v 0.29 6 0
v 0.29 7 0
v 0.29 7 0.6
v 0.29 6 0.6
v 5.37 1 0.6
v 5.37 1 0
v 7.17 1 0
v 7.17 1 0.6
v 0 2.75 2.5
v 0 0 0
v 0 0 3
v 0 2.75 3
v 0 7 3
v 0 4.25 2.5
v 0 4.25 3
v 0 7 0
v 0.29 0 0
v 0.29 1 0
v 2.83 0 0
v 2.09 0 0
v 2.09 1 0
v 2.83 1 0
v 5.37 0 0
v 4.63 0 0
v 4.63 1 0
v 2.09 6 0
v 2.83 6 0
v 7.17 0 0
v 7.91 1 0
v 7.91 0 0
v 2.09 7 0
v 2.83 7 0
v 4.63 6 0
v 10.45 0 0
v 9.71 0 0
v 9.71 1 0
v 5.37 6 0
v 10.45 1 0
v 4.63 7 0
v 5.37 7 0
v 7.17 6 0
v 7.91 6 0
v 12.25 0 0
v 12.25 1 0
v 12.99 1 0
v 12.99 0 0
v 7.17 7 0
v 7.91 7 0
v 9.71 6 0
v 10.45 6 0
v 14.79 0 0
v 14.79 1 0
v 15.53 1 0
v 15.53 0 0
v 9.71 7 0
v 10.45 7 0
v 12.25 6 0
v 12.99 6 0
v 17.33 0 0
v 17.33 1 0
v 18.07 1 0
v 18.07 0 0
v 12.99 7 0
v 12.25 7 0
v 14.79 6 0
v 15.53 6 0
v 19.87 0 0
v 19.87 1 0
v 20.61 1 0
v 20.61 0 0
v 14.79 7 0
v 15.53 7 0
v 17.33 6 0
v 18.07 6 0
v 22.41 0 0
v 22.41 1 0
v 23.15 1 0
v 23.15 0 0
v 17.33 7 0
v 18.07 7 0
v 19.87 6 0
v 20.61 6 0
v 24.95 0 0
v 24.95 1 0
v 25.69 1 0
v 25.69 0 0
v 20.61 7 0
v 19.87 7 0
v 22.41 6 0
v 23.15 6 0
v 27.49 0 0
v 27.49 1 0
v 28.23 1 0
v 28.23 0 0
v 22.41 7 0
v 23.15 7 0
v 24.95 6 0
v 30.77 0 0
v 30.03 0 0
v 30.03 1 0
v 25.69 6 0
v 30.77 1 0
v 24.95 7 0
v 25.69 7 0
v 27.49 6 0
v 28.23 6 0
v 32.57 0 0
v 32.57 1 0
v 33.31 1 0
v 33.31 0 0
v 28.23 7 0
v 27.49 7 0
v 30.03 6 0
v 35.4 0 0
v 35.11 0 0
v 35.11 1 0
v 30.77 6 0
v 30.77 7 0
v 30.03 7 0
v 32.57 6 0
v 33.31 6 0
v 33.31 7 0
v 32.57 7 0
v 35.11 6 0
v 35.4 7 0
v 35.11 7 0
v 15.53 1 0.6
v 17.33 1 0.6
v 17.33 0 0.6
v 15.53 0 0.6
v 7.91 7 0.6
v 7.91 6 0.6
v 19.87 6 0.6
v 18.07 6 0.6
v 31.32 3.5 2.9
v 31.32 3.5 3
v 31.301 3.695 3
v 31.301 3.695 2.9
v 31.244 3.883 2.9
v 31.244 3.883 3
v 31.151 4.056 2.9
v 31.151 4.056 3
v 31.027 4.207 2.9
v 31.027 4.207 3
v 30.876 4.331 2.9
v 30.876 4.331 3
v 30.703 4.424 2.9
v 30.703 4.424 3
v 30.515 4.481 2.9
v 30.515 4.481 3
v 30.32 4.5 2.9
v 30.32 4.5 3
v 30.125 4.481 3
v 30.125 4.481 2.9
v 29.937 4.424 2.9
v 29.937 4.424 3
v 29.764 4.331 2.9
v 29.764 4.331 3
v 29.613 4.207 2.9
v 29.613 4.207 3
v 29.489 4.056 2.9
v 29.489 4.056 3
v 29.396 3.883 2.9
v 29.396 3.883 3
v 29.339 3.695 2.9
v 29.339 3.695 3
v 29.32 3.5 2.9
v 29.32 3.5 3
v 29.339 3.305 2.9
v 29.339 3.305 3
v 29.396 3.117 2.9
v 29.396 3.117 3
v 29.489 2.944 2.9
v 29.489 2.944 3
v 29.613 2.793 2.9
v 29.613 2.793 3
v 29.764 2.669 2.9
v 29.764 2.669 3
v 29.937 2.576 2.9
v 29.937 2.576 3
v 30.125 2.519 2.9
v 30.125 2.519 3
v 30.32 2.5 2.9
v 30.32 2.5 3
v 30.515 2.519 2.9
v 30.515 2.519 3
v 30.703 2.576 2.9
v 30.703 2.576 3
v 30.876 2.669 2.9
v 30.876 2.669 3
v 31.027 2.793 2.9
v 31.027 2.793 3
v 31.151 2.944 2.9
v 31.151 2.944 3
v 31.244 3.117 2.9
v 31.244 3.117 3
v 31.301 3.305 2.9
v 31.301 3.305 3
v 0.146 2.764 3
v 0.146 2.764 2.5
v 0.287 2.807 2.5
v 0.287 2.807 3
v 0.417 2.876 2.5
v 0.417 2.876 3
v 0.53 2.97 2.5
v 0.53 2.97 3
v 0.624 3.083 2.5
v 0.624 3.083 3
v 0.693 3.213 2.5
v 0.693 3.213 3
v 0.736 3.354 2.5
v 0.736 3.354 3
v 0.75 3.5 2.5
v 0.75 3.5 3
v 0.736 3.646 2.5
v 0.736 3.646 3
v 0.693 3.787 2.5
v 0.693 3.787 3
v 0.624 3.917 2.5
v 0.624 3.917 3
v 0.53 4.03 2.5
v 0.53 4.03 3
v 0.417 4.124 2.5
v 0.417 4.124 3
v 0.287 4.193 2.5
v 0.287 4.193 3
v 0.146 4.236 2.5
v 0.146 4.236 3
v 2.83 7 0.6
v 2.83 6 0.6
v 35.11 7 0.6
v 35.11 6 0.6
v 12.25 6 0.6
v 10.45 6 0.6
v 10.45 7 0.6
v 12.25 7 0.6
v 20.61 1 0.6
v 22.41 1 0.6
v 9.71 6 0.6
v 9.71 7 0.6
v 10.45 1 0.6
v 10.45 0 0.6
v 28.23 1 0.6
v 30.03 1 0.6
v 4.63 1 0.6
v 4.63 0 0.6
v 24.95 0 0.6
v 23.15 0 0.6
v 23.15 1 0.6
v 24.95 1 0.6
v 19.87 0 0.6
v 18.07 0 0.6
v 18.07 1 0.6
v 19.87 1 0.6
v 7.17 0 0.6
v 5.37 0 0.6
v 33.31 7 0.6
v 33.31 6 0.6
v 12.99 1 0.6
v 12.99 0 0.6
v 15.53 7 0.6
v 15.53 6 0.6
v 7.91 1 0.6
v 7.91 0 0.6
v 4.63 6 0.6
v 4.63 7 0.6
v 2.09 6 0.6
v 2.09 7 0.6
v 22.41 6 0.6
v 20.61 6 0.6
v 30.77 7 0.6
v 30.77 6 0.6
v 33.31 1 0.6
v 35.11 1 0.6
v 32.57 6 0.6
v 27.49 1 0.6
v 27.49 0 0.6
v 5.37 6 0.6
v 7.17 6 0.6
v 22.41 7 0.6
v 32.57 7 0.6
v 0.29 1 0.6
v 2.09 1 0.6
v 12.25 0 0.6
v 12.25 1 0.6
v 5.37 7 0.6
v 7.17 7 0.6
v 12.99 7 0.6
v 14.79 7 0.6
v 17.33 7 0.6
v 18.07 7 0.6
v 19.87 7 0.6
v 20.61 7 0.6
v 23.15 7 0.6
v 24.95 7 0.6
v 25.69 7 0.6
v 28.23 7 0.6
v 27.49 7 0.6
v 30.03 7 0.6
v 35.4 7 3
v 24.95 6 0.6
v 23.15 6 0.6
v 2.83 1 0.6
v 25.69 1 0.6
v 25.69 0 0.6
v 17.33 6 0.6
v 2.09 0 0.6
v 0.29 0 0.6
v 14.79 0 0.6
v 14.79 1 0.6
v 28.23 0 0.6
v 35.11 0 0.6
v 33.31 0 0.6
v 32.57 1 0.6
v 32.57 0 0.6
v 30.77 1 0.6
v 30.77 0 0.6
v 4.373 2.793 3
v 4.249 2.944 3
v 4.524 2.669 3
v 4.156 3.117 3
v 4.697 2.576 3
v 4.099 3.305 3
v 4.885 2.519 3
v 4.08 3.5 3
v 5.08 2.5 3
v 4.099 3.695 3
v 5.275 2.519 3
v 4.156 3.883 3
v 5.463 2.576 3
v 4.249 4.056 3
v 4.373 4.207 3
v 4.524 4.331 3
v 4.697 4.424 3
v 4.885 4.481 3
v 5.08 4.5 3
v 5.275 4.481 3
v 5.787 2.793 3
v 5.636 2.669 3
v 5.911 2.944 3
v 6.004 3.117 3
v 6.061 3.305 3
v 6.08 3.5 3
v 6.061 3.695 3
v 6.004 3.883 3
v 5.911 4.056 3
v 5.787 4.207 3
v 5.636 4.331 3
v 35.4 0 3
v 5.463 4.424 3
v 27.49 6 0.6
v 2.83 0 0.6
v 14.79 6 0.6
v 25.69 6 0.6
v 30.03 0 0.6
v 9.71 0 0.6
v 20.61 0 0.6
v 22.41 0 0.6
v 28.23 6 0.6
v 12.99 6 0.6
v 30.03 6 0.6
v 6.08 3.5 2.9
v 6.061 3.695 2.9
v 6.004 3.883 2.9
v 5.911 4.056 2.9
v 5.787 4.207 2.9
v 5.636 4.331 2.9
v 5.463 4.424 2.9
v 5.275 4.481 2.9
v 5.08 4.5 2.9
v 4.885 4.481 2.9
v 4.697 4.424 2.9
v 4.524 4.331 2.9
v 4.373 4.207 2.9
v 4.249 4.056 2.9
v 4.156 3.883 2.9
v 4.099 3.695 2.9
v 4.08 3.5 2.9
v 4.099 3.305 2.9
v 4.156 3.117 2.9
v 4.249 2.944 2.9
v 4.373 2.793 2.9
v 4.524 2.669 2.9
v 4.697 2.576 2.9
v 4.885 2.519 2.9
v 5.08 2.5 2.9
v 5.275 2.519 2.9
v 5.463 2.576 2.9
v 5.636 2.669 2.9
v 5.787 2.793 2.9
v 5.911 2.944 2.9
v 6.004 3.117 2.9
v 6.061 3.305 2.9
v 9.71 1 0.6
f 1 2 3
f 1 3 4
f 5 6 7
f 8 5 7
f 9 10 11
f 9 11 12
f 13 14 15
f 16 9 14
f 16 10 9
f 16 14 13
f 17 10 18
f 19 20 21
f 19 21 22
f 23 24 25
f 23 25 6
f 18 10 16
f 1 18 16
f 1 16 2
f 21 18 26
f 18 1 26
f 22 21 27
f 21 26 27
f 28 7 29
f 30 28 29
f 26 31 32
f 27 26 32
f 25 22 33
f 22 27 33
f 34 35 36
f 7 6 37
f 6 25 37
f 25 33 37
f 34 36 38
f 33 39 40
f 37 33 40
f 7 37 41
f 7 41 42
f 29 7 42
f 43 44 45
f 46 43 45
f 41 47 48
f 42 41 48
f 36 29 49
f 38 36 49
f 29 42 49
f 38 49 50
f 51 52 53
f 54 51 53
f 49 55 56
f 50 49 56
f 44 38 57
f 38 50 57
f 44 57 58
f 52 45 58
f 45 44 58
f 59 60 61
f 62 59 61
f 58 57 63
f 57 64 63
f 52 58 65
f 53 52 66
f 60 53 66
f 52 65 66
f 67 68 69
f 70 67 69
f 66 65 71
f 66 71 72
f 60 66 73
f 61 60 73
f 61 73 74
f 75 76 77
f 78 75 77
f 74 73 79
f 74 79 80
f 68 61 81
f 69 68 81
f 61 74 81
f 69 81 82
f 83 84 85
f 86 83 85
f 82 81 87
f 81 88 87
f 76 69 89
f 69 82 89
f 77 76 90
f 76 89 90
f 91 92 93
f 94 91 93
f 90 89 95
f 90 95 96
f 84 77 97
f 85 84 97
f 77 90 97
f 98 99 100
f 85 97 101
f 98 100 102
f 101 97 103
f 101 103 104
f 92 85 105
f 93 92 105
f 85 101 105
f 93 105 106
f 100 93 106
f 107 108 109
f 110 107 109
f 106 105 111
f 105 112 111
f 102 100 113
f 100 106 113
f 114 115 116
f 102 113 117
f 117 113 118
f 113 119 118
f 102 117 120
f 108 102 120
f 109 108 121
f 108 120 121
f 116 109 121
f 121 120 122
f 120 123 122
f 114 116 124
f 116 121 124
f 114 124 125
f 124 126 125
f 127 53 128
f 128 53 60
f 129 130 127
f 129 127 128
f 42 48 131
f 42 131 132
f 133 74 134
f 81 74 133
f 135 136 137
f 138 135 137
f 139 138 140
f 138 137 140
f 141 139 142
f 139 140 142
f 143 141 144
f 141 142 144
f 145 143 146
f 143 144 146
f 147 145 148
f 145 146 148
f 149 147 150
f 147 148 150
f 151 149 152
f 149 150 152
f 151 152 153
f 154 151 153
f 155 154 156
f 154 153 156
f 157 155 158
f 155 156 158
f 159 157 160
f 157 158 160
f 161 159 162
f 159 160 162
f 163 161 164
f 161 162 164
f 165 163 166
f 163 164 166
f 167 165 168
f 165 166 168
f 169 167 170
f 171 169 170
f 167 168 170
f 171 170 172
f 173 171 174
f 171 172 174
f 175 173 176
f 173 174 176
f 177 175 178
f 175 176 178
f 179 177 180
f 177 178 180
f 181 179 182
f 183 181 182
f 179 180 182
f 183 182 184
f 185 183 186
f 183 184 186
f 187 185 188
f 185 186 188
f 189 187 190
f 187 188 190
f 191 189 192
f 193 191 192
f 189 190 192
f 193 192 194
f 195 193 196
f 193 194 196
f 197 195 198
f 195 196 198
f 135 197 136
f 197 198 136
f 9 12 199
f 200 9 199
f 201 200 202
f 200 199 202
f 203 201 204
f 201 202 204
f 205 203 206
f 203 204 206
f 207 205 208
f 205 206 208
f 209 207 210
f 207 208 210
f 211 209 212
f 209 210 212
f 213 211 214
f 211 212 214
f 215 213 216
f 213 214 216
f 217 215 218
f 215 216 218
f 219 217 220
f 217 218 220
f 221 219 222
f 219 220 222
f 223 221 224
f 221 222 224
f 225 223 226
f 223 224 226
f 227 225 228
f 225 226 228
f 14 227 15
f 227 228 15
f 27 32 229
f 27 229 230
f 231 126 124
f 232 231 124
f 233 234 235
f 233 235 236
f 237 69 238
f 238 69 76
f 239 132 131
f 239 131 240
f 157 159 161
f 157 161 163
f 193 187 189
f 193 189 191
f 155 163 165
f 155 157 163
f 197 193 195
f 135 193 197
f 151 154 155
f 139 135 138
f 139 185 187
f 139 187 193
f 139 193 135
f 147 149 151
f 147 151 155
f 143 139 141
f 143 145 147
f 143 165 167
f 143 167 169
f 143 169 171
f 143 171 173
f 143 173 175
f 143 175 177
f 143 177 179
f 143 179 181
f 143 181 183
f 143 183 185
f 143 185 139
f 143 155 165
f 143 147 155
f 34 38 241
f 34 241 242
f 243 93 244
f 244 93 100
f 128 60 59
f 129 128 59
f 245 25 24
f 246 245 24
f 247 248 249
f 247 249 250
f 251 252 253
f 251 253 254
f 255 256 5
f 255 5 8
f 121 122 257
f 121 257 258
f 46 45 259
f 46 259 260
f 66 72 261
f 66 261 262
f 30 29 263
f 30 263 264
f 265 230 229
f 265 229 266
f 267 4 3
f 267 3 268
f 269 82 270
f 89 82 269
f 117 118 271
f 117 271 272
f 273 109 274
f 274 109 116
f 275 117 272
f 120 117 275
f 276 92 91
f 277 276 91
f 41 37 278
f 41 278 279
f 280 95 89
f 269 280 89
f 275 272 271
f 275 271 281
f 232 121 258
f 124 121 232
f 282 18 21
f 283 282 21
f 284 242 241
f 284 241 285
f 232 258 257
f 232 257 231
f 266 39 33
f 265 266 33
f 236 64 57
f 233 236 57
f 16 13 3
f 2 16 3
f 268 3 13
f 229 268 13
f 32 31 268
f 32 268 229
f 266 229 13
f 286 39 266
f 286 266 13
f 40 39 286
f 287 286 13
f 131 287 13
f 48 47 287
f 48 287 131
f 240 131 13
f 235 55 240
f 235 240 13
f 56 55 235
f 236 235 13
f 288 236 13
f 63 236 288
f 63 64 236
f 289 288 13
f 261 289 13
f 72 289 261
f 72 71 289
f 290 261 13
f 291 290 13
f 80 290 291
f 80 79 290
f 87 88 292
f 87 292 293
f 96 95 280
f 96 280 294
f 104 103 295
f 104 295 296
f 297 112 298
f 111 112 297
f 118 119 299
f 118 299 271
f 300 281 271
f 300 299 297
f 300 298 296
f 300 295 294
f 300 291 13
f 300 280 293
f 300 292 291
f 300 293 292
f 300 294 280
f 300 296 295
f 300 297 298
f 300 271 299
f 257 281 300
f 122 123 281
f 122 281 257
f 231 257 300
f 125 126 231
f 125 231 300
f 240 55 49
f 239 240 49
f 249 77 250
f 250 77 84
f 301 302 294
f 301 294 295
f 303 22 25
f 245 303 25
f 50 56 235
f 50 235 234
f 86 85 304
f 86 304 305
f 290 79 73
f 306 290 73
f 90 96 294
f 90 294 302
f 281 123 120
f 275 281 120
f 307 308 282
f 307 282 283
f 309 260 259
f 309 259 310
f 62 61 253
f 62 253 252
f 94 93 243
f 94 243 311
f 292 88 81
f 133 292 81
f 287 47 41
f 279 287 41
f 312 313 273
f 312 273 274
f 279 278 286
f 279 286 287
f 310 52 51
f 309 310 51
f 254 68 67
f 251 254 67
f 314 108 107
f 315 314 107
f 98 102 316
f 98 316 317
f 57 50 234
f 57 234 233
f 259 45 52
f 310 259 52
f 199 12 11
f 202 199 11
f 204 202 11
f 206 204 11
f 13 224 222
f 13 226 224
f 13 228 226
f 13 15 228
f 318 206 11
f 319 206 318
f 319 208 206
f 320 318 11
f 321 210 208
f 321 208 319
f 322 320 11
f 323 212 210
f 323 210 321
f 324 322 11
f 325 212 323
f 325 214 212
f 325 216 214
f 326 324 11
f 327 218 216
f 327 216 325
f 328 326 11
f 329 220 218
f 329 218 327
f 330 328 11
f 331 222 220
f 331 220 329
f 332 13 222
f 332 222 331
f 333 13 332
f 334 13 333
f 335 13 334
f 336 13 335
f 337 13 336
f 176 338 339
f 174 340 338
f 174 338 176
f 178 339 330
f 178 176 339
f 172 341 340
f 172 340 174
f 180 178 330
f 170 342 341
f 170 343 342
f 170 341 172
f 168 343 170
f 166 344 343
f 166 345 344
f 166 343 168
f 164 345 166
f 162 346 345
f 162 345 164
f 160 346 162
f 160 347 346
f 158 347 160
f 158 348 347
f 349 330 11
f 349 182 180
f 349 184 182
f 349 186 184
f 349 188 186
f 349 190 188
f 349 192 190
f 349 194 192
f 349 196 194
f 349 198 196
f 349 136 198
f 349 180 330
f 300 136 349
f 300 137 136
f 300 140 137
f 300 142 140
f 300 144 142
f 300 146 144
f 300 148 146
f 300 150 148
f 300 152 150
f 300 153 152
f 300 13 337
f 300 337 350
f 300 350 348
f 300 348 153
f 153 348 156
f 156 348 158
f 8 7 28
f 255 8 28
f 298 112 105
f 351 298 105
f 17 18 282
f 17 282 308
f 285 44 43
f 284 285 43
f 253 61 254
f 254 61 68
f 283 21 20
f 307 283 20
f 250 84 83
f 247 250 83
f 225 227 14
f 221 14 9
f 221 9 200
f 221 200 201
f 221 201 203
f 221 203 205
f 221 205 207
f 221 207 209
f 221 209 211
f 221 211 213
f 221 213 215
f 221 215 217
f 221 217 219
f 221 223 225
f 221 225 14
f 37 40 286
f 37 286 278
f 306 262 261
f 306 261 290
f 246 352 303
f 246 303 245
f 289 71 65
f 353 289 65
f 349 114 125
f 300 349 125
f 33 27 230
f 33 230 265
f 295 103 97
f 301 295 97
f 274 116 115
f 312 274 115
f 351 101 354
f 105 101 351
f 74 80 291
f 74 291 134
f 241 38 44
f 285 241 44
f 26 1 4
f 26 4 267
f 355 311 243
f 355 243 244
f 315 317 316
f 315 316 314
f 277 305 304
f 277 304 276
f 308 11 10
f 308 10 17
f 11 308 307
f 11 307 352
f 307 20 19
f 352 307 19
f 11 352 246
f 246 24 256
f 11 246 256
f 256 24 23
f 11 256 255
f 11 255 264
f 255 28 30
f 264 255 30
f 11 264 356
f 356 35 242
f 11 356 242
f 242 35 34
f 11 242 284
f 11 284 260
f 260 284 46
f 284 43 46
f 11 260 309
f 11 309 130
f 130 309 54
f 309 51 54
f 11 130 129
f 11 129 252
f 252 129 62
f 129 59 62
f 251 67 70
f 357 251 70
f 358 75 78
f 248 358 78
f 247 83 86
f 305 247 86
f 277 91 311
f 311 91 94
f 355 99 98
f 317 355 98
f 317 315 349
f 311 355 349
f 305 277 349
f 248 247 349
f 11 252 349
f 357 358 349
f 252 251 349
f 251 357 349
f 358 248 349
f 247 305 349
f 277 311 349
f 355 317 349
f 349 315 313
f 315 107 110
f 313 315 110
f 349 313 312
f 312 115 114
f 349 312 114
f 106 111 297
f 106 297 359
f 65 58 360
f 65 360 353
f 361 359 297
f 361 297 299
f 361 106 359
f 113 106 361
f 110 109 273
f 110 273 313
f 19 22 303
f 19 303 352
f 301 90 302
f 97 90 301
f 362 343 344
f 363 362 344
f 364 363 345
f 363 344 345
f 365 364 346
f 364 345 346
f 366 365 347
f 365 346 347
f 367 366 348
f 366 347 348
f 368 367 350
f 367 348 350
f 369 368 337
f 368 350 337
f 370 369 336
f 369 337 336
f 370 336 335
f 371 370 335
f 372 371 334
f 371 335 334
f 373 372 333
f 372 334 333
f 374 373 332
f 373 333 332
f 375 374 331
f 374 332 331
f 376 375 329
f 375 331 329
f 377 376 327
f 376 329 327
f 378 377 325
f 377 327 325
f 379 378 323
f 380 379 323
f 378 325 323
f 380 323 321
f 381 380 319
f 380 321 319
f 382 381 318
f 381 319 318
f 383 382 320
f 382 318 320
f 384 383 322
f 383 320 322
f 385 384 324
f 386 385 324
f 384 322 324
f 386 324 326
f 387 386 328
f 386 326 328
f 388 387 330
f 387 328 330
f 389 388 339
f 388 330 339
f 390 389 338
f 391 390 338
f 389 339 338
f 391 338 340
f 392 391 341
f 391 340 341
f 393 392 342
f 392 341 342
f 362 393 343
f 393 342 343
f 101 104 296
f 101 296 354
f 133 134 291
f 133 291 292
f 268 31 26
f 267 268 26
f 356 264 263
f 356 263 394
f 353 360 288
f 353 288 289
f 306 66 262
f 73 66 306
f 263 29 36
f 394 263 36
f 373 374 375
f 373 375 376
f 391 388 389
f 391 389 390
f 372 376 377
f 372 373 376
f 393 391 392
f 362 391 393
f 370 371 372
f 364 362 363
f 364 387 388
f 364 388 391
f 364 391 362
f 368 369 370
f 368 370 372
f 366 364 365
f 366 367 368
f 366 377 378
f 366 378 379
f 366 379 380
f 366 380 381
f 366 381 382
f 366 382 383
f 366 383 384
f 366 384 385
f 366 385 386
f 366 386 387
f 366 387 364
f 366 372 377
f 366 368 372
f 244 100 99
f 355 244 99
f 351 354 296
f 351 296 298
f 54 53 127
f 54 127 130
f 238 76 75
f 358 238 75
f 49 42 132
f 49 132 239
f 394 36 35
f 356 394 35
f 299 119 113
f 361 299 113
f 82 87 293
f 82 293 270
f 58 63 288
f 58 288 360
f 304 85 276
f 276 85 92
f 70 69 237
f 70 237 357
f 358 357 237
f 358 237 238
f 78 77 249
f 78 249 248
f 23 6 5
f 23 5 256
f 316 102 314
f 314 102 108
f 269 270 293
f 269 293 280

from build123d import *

# Parameters (mm, degrees)
F0_W     = 35.4
F0_H     = 7
F1_DEPTH = 3
F2_W     = 1.8
F2_H     = 1
F3_DEPTH = 0.6
F4_R     = 1
F5_DEPTH = 0.1
F7_DEPTH = 0.5


with BuildPart() as f1:
    # F0 (on Top) → F1 (new body)
    with BuildSketch(Plane.XY):
        with Locations((17.7, 3.5)):
            Rectangle(F0_W, F0_H)
    extrude(amount=F1_DEPTH)

    # F2 (on face) → F3 (cut)
    with BuildSketch(Plane(origin=(0, 0, 0), x_dir=(1, 0, 0), z_dir=(0, 0, -1))):
        with Locations((1.19, -0.5)):
            Rectangle(F2_W, F2_H)
        with Locations((3.73, -0.5)):
            Rectangle(F2_W, F2_H)
        with Locations((6.27, -0.5)):
            Rectangle(F2_W, F2_H)
        with Locations((8.81, -0.5)):
            Rectangle(F2_W, F2_H)
        with Locations((11.35, -0.5)):
            Rectangle(F2_W, F2_H)
        with Locations((13.89, -0.5)):
            Rectangle(F2_W, F2_H)
        with Locations((16.43, -0.5)):
            Rectangle(F2_W, F2_H)
        with Locations((18.97, -0.5)):
            Rectangle(F2_W, F2_H)
        with Locations((21.51, -0.5)):
            Rectangle(F2_W, F2_H)
        with Locations((24.05, -0.5)):
            Rectangle(F2_W, F2_H)
        with Locations((26.59, -0.5)):
            Rectangle(F2_W, F2_H)
        with Locations((29.13, -0.5)):
            Rectangle(F2_W, F2_H)
        with Locations((31.67, -0.5)):
            Rectangle(F2_W, F2_H)
        with Locations((34.21, -0.5)):
            Rectangle(F2_W, F2_H)
        with Locations((34.21, -6.5)):
            Rectangle(F2_W, F2_H)
        with Locations((31.67, -6.5)):
            Rectangle(F2_W, F2_H)
        with Locations((29.13, -6.5)):
            Rectangle(F2_W, F2_H)
        with Locations((26.59, -6.5)):
            Rectangle(F2_W, F2_H)
        with Locations((24.05, -6.5)):
            Rectangle(F2_W, F2_H)
        with Locations((21.51, -6.5)):
            Rectangle(F2_W, F2_H)
        with Locations((18.97, -6.5)):
            Rectangle(F2_W, F2_H)
        with Locations((16.43, -6.5)):
            Rectangle(F2_W, F2_H)
        with Locations((13.89, -6.5)):
            Rectangle(F2_W, F2_H)
        with Locations((11.35, -6.5)):
            Rectangle(F2_W, F2_H)
        with Locations((8.81, -6.5)):
            Rectangle(F2_W, F2_H)
        with Locations((6.27, -6.5)):
            Rectangle(F2_W, F2_H)
        with Locations((3.73, -6.5)):
            Rectangle(F2_W, F2_H)
        with Locations((1.19, -6.5)):
            Rectangle(F2_W, F2_H)
    extrude(amount=-F3_DEPTH, mode=Mode.SUBTRACT)

    # F4 (on face) → F5 (cut)
    with BuildSketch(Plane.XY.offset(3)):
        with Locations((5.08, 3.5)):
            Circle(F4_R)
        with Locations((30.32, 3.5)):
            Circle(F4_R)
    extrude(amount=-F5_DEPTH, mode=Mode.SUBTRACT)

    # F6 (on face) → F7 (cut)
    with BuildSketch(Plane.XY.offset(3)):
        with BuildLine():
            Line((0, 4.25), (0, 2.75))
            ThreePointArc((0, 2.75), (0.75, 3.5), (0, 4.25))
        make_face()
    extrude(amount=-F7_DEPTH, mode=Mode.SUBTRACT)


solid = f1.part
